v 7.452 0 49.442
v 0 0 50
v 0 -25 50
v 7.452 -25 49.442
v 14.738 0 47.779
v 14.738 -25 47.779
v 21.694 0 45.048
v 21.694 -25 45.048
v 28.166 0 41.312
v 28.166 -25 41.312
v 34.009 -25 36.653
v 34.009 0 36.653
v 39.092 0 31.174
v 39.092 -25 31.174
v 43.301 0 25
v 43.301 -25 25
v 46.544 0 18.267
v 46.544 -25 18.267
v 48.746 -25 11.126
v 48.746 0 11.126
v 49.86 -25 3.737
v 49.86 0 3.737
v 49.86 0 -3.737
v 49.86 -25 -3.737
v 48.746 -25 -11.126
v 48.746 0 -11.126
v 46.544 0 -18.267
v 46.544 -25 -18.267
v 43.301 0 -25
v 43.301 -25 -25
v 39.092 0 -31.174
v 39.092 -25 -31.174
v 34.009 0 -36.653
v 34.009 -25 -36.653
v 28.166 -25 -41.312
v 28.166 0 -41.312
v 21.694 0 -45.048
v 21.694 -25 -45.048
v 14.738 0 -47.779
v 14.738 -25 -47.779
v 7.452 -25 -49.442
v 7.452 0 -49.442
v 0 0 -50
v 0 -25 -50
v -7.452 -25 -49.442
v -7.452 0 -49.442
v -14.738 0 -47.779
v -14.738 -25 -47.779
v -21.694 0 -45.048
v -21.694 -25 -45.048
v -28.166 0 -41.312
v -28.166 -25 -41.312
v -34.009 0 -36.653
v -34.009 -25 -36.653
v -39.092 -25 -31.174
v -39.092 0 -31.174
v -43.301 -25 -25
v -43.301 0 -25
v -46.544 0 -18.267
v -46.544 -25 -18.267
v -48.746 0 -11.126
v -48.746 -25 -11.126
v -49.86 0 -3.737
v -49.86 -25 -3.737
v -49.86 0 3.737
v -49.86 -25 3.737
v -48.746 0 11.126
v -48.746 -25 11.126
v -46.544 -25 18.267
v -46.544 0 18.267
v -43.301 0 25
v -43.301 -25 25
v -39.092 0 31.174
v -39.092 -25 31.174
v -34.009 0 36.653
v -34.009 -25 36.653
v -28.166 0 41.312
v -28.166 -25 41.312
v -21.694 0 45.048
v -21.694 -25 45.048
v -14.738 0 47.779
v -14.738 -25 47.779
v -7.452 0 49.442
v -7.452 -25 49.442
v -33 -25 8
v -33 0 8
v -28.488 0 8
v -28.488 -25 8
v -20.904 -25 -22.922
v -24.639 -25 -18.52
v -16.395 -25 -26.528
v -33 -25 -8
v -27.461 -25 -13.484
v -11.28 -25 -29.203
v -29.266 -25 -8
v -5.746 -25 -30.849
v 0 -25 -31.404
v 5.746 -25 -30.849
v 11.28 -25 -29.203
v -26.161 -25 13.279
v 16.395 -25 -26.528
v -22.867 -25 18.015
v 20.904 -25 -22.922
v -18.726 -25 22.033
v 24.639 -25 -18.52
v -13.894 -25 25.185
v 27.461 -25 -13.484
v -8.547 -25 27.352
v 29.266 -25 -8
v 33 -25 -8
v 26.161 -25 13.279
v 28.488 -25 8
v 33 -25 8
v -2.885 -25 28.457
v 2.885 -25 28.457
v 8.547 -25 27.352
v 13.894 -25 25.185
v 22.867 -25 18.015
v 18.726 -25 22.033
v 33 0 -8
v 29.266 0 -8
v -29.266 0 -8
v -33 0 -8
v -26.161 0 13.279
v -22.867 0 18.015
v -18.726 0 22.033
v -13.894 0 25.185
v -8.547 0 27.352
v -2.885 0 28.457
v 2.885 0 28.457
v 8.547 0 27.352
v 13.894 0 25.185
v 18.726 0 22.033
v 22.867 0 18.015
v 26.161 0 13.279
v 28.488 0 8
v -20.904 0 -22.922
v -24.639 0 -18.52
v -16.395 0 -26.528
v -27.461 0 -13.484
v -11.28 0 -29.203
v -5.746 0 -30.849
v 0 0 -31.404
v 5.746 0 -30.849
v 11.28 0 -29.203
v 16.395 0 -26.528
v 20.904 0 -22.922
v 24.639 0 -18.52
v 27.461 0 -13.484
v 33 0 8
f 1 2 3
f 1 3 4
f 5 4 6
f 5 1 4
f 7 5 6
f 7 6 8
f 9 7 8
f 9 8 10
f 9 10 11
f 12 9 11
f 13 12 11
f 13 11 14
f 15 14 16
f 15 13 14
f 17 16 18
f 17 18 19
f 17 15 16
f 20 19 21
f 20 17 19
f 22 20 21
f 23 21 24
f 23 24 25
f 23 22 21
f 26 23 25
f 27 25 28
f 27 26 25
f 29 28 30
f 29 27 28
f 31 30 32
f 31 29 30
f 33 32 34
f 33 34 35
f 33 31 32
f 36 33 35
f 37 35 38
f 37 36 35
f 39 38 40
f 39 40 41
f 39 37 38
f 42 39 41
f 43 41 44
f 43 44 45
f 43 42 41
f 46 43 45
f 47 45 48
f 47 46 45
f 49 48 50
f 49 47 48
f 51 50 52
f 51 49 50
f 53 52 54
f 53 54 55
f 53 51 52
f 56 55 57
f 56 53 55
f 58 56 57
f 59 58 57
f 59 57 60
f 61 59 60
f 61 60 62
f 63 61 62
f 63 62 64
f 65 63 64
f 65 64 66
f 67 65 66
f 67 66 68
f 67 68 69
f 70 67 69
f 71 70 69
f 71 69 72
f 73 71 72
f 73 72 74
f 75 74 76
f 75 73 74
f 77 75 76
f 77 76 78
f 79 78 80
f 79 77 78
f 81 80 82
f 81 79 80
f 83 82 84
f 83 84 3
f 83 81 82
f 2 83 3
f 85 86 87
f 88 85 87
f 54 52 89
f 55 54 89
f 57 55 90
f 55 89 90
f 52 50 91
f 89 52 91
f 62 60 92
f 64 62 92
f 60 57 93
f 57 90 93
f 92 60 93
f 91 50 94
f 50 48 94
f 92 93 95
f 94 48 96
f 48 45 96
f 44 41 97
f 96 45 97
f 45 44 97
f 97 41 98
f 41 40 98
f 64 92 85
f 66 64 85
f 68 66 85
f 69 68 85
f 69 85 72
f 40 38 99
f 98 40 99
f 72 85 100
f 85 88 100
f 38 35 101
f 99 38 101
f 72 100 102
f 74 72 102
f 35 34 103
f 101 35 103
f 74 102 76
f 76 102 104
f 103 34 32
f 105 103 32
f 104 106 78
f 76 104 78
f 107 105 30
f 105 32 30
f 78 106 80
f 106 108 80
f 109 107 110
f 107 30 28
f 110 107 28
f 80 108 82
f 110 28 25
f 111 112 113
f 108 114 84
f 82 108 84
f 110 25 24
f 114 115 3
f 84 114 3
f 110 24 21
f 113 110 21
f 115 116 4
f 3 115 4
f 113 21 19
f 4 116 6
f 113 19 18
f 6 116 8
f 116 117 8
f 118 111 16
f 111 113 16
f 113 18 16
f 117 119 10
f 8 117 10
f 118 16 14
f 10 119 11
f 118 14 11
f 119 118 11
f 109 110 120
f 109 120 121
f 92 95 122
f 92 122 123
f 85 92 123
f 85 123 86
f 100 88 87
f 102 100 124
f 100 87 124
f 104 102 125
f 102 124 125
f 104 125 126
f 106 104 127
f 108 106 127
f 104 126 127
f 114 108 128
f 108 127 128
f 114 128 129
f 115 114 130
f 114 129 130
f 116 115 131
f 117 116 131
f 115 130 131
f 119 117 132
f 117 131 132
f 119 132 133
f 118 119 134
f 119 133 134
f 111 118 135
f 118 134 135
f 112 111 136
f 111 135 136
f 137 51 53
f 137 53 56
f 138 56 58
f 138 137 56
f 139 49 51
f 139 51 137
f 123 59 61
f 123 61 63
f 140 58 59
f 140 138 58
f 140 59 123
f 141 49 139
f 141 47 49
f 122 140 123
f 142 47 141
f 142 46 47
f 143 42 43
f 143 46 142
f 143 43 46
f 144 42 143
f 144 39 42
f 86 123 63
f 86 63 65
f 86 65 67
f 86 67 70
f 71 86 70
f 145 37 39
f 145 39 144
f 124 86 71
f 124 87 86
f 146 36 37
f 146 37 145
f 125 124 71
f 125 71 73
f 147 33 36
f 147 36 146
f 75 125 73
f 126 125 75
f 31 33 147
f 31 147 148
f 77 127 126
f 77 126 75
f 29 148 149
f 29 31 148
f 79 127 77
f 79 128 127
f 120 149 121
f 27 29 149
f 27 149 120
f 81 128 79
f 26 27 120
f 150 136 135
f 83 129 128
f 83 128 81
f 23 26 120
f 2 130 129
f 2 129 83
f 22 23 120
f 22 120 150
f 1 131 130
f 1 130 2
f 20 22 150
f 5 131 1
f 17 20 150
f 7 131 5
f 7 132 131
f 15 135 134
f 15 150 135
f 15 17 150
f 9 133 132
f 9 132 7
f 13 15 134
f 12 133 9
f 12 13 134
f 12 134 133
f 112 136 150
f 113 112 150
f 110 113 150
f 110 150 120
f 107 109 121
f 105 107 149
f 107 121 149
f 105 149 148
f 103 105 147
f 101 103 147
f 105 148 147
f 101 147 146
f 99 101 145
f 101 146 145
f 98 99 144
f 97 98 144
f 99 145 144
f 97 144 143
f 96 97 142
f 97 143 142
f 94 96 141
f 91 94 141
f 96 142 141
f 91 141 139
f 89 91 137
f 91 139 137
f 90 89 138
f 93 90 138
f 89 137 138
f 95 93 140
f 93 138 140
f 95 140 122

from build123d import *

# Parameters (mm, degrees)
SKETCH2_R           = 50
BOSS_EXTRUDE1_DEPTH = 25


with BuildPart() as part:
    # Sketch2 → Boss-Extrude1 (new body)
    with BuildSketch(Plane(origin=(0, 0, 0), x_dir=(1, 0, 0), z_dir=(0, 1, 0))):
        with Locations(Location((0, 0, 0), (0, 0, 270))):
            Circle(SKETCH2_R)
        with BuildLine():
            Line((33, 0), (33, 8))
            Line((33, 8), (29.265964208, 8))
            ThreePointArc((29.265964208, 8), (0, 31.404293899), (-29.265964208, 8))
            Line((-29.265964208, 8), (-33, 8))
            Line((-33, 8), (-33, 0))
            Line((-33, 0), (-33, -8))
            Line((-33, -8), (-28.487879111, -8))
            ThreePointArc((-28.487879111, -8), (0, -28.595706101), (28.487879111, -8))
            Line((28.487879111, -8), (33, -8))
            Line((33, -8), (33, 0))
        make_face(mode=Mode.SUBTRACT)
    extrude(amount=-BOSS_EXTRUDE1_DEPTH)


solid = part.part
